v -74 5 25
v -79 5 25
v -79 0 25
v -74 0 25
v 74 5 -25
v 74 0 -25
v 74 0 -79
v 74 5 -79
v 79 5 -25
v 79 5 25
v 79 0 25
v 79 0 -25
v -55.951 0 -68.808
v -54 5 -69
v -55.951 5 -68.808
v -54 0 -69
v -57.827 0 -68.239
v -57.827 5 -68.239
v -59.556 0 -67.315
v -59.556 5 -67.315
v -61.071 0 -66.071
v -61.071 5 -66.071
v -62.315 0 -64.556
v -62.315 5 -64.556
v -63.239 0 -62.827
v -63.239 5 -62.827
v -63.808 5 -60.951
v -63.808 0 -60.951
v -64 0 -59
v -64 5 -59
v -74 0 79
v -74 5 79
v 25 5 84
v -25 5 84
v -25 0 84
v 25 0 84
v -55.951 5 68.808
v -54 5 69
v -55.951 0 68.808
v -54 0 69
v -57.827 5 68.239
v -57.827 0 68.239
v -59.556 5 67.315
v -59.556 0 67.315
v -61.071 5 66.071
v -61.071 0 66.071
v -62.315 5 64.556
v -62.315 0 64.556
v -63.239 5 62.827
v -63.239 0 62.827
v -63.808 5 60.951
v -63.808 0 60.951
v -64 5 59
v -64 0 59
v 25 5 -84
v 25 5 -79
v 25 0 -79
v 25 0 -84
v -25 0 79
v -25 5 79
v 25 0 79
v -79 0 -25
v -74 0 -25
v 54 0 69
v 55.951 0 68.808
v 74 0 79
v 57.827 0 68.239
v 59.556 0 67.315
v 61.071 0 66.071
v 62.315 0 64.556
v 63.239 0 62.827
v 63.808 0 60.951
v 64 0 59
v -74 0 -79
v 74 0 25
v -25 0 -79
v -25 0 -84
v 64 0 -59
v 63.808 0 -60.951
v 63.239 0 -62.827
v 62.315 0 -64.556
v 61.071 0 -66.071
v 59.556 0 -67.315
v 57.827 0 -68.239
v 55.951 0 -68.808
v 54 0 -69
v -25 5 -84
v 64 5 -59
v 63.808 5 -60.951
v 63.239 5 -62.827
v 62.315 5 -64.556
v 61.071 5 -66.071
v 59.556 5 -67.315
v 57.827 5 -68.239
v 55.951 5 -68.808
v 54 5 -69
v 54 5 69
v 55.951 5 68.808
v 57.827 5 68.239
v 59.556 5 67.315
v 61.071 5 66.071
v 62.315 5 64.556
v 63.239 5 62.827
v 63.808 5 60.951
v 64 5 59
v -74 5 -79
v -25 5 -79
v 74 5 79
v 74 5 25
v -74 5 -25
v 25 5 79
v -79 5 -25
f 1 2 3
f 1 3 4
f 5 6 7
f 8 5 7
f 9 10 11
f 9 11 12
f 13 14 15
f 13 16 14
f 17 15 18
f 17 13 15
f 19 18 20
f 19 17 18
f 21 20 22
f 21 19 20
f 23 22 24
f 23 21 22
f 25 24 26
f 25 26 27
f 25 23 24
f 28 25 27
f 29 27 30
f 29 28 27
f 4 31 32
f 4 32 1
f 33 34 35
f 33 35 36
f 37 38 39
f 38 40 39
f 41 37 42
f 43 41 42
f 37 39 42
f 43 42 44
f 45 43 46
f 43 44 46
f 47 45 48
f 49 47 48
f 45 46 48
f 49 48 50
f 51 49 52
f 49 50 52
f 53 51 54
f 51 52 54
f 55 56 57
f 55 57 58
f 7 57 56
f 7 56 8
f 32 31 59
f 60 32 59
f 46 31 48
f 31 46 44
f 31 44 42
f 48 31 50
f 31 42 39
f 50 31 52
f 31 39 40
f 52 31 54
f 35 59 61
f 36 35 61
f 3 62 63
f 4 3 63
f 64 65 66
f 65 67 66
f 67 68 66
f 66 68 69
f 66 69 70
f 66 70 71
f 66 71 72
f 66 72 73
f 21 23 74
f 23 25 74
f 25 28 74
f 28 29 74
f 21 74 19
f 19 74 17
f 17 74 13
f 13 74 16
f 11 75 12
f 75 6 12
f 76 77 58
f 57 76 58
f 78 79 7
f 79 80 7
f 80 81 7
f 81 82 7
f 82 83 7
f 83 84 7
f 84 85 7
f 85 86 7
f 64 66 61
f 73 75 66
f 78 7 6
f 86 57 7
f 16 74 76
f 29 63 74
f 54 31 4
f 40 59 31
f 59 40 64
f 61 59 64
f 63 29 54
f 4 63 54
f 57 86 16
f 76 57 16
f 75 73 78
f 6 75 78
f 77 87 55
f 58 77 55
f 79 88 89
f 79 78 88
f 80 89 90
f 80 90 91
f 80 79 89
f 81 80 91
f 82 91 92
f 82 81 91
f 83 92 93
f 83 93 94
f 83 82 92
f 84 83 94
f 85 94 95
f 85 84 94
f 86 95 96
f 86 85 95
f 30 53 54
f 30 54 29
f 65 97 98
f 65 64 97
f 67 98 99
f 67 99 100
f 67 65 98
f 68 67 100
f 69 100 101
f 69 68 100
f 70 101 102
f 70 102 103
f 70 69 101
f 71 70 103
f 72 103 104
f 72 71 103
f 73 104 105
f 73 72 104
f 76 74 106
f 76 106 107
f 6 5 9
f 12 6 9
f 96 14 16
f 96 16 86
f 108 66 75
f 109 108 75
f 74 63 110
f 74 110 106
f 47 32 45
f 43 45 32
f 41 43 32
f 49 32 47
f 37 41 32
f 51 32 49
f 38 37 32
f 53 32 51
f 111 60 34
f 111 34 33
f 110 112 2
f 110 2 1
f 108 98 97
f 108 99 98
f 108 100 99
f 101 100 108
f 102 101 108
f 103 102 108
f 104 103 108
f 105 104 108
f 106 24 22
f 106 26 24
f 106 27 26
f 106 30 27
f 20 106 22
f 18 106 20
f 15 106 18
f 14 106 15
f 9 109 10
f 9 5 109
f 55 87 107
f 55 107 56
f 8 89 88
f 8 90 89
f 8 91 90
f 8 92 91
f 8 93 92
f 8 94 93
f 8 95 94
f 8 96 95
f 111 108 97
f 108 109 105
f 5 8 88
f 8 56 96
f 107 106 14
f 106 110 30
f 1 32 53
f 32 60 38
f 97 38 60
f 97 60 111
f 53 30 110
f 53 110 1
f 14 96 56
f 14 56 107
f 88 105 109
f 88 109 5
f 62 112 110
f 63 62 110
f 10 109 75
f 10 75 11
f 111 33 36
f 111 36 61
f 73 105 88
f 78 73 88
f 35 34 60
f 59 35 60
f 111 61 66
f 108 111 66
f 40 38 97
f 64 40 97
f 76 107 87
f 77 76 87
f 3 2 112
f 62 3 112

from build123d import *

# Parameters (mm, degrees)
SKIZZE1_W                       = 148
SKIZZE1_H                       = 158
AUFSATZ_LINEAR_AUSTRAGEN1_DEPTH = 5
SKIZZE2_W                       = 158
SKIZZE2_H                       = 50
AUFSATZ_LINEAR_AUSTRAGEN2_DEPTH = 5
SKIZZE3_W                       = 50
SKIZZE3_H                       = 168
AUFSATZ_LINEAR_AUSTRAGEN3_DEPTH = 5
SKIZZE4_R                       = 50
SCHNITT_LINEAR_AUSTRAGEN1_DEPTH = 5
SKIZZE5_W                       = 128
SKIZZE5_H                       = 138
SCHNITT_LINEAR_AUSTRAGEN2_DEPTH = 116.420968632
VERRUNDUNG1_R                   = 10


with BuildPart() as part:
    # Skizze1 → Aufsatz-Linear austragen1 (new body)
    with BuildSketch(Plane(origin=(0, 0, 0), x_dir=(1, 0, 0), z_dir=(0, 1, 0))):
        Rectangle(SKIZZE1_W, SKIZZE1_H)
    extrude(amount=AUFSATZ_LINEAR_AUSTRAGEN1_DEPTH)

    # Skizze2 → Aufsatz-Linear austragen2 (add)
    with BuildSketch(Plane(origin=(0, 5, 0), x_dir=(1, 0, 0), z_dir=(0, 1, 0))):
        Rectangle(SKIZZE2_W, SKIZZE2_H)
    extrude(amount=-AUFSATZ_LINEAR_AUSTRAGEN2_DEPTH)

    # Skizze3 → Aufsatz-Linear austragen3 (add)
    with BuildSketch(Plane(origin=(0, 5, 0), x_dir=(1, 0, 0), z_dir=(0, 1, 0))):
        Rectangle(SKIZZE3_W, SKIZZE3_H)
    extrude(amount=-AUFSATZ_LINEAR_AUSTRAGEN3_DEPTH)

    # Skizze4 → Schnitt-Linear austragen1 (cut)
    with BuildSketch(Plane(origin=(0, 5, 0), x_dir=(1, 0, 0), z_dir=(0, 1, 0))):
        Circle(SKIZZE4_R)
    extrude(amount=-SCHNITT_LINEAR_AUSTRAGEN1_DEPTH, mode=Mode.SUBTRACT)

    # Skizze5 → Schnitt-Linear austragen2 (cut, through all)
    with BuildSketch(Plane(origin=(0, 5, 0), x_dir=(1, 0, 0), z_dir=(0, 1, 0))):
        Rectangle(SKIZZE5_W, SKIZZE5_H)
    extrude(amount=-SCHNITT_LINEAR_AUSTRAGEN2_DEPTH, mode=Mode.SUBTRACT)

    # Verrundung1
    verrundung1_edges = [part.edges().sort_by_distance(p)[0] for p in [
        (-64, 2.5, 69),
        (64, 2.5, 69),
        (64, 2.5, -69),
        (-64, 2.5, -69),
    ]]
    fillet(verrundung1_edges, radius=VERRUNDUNG1_R)


solid = part.part
